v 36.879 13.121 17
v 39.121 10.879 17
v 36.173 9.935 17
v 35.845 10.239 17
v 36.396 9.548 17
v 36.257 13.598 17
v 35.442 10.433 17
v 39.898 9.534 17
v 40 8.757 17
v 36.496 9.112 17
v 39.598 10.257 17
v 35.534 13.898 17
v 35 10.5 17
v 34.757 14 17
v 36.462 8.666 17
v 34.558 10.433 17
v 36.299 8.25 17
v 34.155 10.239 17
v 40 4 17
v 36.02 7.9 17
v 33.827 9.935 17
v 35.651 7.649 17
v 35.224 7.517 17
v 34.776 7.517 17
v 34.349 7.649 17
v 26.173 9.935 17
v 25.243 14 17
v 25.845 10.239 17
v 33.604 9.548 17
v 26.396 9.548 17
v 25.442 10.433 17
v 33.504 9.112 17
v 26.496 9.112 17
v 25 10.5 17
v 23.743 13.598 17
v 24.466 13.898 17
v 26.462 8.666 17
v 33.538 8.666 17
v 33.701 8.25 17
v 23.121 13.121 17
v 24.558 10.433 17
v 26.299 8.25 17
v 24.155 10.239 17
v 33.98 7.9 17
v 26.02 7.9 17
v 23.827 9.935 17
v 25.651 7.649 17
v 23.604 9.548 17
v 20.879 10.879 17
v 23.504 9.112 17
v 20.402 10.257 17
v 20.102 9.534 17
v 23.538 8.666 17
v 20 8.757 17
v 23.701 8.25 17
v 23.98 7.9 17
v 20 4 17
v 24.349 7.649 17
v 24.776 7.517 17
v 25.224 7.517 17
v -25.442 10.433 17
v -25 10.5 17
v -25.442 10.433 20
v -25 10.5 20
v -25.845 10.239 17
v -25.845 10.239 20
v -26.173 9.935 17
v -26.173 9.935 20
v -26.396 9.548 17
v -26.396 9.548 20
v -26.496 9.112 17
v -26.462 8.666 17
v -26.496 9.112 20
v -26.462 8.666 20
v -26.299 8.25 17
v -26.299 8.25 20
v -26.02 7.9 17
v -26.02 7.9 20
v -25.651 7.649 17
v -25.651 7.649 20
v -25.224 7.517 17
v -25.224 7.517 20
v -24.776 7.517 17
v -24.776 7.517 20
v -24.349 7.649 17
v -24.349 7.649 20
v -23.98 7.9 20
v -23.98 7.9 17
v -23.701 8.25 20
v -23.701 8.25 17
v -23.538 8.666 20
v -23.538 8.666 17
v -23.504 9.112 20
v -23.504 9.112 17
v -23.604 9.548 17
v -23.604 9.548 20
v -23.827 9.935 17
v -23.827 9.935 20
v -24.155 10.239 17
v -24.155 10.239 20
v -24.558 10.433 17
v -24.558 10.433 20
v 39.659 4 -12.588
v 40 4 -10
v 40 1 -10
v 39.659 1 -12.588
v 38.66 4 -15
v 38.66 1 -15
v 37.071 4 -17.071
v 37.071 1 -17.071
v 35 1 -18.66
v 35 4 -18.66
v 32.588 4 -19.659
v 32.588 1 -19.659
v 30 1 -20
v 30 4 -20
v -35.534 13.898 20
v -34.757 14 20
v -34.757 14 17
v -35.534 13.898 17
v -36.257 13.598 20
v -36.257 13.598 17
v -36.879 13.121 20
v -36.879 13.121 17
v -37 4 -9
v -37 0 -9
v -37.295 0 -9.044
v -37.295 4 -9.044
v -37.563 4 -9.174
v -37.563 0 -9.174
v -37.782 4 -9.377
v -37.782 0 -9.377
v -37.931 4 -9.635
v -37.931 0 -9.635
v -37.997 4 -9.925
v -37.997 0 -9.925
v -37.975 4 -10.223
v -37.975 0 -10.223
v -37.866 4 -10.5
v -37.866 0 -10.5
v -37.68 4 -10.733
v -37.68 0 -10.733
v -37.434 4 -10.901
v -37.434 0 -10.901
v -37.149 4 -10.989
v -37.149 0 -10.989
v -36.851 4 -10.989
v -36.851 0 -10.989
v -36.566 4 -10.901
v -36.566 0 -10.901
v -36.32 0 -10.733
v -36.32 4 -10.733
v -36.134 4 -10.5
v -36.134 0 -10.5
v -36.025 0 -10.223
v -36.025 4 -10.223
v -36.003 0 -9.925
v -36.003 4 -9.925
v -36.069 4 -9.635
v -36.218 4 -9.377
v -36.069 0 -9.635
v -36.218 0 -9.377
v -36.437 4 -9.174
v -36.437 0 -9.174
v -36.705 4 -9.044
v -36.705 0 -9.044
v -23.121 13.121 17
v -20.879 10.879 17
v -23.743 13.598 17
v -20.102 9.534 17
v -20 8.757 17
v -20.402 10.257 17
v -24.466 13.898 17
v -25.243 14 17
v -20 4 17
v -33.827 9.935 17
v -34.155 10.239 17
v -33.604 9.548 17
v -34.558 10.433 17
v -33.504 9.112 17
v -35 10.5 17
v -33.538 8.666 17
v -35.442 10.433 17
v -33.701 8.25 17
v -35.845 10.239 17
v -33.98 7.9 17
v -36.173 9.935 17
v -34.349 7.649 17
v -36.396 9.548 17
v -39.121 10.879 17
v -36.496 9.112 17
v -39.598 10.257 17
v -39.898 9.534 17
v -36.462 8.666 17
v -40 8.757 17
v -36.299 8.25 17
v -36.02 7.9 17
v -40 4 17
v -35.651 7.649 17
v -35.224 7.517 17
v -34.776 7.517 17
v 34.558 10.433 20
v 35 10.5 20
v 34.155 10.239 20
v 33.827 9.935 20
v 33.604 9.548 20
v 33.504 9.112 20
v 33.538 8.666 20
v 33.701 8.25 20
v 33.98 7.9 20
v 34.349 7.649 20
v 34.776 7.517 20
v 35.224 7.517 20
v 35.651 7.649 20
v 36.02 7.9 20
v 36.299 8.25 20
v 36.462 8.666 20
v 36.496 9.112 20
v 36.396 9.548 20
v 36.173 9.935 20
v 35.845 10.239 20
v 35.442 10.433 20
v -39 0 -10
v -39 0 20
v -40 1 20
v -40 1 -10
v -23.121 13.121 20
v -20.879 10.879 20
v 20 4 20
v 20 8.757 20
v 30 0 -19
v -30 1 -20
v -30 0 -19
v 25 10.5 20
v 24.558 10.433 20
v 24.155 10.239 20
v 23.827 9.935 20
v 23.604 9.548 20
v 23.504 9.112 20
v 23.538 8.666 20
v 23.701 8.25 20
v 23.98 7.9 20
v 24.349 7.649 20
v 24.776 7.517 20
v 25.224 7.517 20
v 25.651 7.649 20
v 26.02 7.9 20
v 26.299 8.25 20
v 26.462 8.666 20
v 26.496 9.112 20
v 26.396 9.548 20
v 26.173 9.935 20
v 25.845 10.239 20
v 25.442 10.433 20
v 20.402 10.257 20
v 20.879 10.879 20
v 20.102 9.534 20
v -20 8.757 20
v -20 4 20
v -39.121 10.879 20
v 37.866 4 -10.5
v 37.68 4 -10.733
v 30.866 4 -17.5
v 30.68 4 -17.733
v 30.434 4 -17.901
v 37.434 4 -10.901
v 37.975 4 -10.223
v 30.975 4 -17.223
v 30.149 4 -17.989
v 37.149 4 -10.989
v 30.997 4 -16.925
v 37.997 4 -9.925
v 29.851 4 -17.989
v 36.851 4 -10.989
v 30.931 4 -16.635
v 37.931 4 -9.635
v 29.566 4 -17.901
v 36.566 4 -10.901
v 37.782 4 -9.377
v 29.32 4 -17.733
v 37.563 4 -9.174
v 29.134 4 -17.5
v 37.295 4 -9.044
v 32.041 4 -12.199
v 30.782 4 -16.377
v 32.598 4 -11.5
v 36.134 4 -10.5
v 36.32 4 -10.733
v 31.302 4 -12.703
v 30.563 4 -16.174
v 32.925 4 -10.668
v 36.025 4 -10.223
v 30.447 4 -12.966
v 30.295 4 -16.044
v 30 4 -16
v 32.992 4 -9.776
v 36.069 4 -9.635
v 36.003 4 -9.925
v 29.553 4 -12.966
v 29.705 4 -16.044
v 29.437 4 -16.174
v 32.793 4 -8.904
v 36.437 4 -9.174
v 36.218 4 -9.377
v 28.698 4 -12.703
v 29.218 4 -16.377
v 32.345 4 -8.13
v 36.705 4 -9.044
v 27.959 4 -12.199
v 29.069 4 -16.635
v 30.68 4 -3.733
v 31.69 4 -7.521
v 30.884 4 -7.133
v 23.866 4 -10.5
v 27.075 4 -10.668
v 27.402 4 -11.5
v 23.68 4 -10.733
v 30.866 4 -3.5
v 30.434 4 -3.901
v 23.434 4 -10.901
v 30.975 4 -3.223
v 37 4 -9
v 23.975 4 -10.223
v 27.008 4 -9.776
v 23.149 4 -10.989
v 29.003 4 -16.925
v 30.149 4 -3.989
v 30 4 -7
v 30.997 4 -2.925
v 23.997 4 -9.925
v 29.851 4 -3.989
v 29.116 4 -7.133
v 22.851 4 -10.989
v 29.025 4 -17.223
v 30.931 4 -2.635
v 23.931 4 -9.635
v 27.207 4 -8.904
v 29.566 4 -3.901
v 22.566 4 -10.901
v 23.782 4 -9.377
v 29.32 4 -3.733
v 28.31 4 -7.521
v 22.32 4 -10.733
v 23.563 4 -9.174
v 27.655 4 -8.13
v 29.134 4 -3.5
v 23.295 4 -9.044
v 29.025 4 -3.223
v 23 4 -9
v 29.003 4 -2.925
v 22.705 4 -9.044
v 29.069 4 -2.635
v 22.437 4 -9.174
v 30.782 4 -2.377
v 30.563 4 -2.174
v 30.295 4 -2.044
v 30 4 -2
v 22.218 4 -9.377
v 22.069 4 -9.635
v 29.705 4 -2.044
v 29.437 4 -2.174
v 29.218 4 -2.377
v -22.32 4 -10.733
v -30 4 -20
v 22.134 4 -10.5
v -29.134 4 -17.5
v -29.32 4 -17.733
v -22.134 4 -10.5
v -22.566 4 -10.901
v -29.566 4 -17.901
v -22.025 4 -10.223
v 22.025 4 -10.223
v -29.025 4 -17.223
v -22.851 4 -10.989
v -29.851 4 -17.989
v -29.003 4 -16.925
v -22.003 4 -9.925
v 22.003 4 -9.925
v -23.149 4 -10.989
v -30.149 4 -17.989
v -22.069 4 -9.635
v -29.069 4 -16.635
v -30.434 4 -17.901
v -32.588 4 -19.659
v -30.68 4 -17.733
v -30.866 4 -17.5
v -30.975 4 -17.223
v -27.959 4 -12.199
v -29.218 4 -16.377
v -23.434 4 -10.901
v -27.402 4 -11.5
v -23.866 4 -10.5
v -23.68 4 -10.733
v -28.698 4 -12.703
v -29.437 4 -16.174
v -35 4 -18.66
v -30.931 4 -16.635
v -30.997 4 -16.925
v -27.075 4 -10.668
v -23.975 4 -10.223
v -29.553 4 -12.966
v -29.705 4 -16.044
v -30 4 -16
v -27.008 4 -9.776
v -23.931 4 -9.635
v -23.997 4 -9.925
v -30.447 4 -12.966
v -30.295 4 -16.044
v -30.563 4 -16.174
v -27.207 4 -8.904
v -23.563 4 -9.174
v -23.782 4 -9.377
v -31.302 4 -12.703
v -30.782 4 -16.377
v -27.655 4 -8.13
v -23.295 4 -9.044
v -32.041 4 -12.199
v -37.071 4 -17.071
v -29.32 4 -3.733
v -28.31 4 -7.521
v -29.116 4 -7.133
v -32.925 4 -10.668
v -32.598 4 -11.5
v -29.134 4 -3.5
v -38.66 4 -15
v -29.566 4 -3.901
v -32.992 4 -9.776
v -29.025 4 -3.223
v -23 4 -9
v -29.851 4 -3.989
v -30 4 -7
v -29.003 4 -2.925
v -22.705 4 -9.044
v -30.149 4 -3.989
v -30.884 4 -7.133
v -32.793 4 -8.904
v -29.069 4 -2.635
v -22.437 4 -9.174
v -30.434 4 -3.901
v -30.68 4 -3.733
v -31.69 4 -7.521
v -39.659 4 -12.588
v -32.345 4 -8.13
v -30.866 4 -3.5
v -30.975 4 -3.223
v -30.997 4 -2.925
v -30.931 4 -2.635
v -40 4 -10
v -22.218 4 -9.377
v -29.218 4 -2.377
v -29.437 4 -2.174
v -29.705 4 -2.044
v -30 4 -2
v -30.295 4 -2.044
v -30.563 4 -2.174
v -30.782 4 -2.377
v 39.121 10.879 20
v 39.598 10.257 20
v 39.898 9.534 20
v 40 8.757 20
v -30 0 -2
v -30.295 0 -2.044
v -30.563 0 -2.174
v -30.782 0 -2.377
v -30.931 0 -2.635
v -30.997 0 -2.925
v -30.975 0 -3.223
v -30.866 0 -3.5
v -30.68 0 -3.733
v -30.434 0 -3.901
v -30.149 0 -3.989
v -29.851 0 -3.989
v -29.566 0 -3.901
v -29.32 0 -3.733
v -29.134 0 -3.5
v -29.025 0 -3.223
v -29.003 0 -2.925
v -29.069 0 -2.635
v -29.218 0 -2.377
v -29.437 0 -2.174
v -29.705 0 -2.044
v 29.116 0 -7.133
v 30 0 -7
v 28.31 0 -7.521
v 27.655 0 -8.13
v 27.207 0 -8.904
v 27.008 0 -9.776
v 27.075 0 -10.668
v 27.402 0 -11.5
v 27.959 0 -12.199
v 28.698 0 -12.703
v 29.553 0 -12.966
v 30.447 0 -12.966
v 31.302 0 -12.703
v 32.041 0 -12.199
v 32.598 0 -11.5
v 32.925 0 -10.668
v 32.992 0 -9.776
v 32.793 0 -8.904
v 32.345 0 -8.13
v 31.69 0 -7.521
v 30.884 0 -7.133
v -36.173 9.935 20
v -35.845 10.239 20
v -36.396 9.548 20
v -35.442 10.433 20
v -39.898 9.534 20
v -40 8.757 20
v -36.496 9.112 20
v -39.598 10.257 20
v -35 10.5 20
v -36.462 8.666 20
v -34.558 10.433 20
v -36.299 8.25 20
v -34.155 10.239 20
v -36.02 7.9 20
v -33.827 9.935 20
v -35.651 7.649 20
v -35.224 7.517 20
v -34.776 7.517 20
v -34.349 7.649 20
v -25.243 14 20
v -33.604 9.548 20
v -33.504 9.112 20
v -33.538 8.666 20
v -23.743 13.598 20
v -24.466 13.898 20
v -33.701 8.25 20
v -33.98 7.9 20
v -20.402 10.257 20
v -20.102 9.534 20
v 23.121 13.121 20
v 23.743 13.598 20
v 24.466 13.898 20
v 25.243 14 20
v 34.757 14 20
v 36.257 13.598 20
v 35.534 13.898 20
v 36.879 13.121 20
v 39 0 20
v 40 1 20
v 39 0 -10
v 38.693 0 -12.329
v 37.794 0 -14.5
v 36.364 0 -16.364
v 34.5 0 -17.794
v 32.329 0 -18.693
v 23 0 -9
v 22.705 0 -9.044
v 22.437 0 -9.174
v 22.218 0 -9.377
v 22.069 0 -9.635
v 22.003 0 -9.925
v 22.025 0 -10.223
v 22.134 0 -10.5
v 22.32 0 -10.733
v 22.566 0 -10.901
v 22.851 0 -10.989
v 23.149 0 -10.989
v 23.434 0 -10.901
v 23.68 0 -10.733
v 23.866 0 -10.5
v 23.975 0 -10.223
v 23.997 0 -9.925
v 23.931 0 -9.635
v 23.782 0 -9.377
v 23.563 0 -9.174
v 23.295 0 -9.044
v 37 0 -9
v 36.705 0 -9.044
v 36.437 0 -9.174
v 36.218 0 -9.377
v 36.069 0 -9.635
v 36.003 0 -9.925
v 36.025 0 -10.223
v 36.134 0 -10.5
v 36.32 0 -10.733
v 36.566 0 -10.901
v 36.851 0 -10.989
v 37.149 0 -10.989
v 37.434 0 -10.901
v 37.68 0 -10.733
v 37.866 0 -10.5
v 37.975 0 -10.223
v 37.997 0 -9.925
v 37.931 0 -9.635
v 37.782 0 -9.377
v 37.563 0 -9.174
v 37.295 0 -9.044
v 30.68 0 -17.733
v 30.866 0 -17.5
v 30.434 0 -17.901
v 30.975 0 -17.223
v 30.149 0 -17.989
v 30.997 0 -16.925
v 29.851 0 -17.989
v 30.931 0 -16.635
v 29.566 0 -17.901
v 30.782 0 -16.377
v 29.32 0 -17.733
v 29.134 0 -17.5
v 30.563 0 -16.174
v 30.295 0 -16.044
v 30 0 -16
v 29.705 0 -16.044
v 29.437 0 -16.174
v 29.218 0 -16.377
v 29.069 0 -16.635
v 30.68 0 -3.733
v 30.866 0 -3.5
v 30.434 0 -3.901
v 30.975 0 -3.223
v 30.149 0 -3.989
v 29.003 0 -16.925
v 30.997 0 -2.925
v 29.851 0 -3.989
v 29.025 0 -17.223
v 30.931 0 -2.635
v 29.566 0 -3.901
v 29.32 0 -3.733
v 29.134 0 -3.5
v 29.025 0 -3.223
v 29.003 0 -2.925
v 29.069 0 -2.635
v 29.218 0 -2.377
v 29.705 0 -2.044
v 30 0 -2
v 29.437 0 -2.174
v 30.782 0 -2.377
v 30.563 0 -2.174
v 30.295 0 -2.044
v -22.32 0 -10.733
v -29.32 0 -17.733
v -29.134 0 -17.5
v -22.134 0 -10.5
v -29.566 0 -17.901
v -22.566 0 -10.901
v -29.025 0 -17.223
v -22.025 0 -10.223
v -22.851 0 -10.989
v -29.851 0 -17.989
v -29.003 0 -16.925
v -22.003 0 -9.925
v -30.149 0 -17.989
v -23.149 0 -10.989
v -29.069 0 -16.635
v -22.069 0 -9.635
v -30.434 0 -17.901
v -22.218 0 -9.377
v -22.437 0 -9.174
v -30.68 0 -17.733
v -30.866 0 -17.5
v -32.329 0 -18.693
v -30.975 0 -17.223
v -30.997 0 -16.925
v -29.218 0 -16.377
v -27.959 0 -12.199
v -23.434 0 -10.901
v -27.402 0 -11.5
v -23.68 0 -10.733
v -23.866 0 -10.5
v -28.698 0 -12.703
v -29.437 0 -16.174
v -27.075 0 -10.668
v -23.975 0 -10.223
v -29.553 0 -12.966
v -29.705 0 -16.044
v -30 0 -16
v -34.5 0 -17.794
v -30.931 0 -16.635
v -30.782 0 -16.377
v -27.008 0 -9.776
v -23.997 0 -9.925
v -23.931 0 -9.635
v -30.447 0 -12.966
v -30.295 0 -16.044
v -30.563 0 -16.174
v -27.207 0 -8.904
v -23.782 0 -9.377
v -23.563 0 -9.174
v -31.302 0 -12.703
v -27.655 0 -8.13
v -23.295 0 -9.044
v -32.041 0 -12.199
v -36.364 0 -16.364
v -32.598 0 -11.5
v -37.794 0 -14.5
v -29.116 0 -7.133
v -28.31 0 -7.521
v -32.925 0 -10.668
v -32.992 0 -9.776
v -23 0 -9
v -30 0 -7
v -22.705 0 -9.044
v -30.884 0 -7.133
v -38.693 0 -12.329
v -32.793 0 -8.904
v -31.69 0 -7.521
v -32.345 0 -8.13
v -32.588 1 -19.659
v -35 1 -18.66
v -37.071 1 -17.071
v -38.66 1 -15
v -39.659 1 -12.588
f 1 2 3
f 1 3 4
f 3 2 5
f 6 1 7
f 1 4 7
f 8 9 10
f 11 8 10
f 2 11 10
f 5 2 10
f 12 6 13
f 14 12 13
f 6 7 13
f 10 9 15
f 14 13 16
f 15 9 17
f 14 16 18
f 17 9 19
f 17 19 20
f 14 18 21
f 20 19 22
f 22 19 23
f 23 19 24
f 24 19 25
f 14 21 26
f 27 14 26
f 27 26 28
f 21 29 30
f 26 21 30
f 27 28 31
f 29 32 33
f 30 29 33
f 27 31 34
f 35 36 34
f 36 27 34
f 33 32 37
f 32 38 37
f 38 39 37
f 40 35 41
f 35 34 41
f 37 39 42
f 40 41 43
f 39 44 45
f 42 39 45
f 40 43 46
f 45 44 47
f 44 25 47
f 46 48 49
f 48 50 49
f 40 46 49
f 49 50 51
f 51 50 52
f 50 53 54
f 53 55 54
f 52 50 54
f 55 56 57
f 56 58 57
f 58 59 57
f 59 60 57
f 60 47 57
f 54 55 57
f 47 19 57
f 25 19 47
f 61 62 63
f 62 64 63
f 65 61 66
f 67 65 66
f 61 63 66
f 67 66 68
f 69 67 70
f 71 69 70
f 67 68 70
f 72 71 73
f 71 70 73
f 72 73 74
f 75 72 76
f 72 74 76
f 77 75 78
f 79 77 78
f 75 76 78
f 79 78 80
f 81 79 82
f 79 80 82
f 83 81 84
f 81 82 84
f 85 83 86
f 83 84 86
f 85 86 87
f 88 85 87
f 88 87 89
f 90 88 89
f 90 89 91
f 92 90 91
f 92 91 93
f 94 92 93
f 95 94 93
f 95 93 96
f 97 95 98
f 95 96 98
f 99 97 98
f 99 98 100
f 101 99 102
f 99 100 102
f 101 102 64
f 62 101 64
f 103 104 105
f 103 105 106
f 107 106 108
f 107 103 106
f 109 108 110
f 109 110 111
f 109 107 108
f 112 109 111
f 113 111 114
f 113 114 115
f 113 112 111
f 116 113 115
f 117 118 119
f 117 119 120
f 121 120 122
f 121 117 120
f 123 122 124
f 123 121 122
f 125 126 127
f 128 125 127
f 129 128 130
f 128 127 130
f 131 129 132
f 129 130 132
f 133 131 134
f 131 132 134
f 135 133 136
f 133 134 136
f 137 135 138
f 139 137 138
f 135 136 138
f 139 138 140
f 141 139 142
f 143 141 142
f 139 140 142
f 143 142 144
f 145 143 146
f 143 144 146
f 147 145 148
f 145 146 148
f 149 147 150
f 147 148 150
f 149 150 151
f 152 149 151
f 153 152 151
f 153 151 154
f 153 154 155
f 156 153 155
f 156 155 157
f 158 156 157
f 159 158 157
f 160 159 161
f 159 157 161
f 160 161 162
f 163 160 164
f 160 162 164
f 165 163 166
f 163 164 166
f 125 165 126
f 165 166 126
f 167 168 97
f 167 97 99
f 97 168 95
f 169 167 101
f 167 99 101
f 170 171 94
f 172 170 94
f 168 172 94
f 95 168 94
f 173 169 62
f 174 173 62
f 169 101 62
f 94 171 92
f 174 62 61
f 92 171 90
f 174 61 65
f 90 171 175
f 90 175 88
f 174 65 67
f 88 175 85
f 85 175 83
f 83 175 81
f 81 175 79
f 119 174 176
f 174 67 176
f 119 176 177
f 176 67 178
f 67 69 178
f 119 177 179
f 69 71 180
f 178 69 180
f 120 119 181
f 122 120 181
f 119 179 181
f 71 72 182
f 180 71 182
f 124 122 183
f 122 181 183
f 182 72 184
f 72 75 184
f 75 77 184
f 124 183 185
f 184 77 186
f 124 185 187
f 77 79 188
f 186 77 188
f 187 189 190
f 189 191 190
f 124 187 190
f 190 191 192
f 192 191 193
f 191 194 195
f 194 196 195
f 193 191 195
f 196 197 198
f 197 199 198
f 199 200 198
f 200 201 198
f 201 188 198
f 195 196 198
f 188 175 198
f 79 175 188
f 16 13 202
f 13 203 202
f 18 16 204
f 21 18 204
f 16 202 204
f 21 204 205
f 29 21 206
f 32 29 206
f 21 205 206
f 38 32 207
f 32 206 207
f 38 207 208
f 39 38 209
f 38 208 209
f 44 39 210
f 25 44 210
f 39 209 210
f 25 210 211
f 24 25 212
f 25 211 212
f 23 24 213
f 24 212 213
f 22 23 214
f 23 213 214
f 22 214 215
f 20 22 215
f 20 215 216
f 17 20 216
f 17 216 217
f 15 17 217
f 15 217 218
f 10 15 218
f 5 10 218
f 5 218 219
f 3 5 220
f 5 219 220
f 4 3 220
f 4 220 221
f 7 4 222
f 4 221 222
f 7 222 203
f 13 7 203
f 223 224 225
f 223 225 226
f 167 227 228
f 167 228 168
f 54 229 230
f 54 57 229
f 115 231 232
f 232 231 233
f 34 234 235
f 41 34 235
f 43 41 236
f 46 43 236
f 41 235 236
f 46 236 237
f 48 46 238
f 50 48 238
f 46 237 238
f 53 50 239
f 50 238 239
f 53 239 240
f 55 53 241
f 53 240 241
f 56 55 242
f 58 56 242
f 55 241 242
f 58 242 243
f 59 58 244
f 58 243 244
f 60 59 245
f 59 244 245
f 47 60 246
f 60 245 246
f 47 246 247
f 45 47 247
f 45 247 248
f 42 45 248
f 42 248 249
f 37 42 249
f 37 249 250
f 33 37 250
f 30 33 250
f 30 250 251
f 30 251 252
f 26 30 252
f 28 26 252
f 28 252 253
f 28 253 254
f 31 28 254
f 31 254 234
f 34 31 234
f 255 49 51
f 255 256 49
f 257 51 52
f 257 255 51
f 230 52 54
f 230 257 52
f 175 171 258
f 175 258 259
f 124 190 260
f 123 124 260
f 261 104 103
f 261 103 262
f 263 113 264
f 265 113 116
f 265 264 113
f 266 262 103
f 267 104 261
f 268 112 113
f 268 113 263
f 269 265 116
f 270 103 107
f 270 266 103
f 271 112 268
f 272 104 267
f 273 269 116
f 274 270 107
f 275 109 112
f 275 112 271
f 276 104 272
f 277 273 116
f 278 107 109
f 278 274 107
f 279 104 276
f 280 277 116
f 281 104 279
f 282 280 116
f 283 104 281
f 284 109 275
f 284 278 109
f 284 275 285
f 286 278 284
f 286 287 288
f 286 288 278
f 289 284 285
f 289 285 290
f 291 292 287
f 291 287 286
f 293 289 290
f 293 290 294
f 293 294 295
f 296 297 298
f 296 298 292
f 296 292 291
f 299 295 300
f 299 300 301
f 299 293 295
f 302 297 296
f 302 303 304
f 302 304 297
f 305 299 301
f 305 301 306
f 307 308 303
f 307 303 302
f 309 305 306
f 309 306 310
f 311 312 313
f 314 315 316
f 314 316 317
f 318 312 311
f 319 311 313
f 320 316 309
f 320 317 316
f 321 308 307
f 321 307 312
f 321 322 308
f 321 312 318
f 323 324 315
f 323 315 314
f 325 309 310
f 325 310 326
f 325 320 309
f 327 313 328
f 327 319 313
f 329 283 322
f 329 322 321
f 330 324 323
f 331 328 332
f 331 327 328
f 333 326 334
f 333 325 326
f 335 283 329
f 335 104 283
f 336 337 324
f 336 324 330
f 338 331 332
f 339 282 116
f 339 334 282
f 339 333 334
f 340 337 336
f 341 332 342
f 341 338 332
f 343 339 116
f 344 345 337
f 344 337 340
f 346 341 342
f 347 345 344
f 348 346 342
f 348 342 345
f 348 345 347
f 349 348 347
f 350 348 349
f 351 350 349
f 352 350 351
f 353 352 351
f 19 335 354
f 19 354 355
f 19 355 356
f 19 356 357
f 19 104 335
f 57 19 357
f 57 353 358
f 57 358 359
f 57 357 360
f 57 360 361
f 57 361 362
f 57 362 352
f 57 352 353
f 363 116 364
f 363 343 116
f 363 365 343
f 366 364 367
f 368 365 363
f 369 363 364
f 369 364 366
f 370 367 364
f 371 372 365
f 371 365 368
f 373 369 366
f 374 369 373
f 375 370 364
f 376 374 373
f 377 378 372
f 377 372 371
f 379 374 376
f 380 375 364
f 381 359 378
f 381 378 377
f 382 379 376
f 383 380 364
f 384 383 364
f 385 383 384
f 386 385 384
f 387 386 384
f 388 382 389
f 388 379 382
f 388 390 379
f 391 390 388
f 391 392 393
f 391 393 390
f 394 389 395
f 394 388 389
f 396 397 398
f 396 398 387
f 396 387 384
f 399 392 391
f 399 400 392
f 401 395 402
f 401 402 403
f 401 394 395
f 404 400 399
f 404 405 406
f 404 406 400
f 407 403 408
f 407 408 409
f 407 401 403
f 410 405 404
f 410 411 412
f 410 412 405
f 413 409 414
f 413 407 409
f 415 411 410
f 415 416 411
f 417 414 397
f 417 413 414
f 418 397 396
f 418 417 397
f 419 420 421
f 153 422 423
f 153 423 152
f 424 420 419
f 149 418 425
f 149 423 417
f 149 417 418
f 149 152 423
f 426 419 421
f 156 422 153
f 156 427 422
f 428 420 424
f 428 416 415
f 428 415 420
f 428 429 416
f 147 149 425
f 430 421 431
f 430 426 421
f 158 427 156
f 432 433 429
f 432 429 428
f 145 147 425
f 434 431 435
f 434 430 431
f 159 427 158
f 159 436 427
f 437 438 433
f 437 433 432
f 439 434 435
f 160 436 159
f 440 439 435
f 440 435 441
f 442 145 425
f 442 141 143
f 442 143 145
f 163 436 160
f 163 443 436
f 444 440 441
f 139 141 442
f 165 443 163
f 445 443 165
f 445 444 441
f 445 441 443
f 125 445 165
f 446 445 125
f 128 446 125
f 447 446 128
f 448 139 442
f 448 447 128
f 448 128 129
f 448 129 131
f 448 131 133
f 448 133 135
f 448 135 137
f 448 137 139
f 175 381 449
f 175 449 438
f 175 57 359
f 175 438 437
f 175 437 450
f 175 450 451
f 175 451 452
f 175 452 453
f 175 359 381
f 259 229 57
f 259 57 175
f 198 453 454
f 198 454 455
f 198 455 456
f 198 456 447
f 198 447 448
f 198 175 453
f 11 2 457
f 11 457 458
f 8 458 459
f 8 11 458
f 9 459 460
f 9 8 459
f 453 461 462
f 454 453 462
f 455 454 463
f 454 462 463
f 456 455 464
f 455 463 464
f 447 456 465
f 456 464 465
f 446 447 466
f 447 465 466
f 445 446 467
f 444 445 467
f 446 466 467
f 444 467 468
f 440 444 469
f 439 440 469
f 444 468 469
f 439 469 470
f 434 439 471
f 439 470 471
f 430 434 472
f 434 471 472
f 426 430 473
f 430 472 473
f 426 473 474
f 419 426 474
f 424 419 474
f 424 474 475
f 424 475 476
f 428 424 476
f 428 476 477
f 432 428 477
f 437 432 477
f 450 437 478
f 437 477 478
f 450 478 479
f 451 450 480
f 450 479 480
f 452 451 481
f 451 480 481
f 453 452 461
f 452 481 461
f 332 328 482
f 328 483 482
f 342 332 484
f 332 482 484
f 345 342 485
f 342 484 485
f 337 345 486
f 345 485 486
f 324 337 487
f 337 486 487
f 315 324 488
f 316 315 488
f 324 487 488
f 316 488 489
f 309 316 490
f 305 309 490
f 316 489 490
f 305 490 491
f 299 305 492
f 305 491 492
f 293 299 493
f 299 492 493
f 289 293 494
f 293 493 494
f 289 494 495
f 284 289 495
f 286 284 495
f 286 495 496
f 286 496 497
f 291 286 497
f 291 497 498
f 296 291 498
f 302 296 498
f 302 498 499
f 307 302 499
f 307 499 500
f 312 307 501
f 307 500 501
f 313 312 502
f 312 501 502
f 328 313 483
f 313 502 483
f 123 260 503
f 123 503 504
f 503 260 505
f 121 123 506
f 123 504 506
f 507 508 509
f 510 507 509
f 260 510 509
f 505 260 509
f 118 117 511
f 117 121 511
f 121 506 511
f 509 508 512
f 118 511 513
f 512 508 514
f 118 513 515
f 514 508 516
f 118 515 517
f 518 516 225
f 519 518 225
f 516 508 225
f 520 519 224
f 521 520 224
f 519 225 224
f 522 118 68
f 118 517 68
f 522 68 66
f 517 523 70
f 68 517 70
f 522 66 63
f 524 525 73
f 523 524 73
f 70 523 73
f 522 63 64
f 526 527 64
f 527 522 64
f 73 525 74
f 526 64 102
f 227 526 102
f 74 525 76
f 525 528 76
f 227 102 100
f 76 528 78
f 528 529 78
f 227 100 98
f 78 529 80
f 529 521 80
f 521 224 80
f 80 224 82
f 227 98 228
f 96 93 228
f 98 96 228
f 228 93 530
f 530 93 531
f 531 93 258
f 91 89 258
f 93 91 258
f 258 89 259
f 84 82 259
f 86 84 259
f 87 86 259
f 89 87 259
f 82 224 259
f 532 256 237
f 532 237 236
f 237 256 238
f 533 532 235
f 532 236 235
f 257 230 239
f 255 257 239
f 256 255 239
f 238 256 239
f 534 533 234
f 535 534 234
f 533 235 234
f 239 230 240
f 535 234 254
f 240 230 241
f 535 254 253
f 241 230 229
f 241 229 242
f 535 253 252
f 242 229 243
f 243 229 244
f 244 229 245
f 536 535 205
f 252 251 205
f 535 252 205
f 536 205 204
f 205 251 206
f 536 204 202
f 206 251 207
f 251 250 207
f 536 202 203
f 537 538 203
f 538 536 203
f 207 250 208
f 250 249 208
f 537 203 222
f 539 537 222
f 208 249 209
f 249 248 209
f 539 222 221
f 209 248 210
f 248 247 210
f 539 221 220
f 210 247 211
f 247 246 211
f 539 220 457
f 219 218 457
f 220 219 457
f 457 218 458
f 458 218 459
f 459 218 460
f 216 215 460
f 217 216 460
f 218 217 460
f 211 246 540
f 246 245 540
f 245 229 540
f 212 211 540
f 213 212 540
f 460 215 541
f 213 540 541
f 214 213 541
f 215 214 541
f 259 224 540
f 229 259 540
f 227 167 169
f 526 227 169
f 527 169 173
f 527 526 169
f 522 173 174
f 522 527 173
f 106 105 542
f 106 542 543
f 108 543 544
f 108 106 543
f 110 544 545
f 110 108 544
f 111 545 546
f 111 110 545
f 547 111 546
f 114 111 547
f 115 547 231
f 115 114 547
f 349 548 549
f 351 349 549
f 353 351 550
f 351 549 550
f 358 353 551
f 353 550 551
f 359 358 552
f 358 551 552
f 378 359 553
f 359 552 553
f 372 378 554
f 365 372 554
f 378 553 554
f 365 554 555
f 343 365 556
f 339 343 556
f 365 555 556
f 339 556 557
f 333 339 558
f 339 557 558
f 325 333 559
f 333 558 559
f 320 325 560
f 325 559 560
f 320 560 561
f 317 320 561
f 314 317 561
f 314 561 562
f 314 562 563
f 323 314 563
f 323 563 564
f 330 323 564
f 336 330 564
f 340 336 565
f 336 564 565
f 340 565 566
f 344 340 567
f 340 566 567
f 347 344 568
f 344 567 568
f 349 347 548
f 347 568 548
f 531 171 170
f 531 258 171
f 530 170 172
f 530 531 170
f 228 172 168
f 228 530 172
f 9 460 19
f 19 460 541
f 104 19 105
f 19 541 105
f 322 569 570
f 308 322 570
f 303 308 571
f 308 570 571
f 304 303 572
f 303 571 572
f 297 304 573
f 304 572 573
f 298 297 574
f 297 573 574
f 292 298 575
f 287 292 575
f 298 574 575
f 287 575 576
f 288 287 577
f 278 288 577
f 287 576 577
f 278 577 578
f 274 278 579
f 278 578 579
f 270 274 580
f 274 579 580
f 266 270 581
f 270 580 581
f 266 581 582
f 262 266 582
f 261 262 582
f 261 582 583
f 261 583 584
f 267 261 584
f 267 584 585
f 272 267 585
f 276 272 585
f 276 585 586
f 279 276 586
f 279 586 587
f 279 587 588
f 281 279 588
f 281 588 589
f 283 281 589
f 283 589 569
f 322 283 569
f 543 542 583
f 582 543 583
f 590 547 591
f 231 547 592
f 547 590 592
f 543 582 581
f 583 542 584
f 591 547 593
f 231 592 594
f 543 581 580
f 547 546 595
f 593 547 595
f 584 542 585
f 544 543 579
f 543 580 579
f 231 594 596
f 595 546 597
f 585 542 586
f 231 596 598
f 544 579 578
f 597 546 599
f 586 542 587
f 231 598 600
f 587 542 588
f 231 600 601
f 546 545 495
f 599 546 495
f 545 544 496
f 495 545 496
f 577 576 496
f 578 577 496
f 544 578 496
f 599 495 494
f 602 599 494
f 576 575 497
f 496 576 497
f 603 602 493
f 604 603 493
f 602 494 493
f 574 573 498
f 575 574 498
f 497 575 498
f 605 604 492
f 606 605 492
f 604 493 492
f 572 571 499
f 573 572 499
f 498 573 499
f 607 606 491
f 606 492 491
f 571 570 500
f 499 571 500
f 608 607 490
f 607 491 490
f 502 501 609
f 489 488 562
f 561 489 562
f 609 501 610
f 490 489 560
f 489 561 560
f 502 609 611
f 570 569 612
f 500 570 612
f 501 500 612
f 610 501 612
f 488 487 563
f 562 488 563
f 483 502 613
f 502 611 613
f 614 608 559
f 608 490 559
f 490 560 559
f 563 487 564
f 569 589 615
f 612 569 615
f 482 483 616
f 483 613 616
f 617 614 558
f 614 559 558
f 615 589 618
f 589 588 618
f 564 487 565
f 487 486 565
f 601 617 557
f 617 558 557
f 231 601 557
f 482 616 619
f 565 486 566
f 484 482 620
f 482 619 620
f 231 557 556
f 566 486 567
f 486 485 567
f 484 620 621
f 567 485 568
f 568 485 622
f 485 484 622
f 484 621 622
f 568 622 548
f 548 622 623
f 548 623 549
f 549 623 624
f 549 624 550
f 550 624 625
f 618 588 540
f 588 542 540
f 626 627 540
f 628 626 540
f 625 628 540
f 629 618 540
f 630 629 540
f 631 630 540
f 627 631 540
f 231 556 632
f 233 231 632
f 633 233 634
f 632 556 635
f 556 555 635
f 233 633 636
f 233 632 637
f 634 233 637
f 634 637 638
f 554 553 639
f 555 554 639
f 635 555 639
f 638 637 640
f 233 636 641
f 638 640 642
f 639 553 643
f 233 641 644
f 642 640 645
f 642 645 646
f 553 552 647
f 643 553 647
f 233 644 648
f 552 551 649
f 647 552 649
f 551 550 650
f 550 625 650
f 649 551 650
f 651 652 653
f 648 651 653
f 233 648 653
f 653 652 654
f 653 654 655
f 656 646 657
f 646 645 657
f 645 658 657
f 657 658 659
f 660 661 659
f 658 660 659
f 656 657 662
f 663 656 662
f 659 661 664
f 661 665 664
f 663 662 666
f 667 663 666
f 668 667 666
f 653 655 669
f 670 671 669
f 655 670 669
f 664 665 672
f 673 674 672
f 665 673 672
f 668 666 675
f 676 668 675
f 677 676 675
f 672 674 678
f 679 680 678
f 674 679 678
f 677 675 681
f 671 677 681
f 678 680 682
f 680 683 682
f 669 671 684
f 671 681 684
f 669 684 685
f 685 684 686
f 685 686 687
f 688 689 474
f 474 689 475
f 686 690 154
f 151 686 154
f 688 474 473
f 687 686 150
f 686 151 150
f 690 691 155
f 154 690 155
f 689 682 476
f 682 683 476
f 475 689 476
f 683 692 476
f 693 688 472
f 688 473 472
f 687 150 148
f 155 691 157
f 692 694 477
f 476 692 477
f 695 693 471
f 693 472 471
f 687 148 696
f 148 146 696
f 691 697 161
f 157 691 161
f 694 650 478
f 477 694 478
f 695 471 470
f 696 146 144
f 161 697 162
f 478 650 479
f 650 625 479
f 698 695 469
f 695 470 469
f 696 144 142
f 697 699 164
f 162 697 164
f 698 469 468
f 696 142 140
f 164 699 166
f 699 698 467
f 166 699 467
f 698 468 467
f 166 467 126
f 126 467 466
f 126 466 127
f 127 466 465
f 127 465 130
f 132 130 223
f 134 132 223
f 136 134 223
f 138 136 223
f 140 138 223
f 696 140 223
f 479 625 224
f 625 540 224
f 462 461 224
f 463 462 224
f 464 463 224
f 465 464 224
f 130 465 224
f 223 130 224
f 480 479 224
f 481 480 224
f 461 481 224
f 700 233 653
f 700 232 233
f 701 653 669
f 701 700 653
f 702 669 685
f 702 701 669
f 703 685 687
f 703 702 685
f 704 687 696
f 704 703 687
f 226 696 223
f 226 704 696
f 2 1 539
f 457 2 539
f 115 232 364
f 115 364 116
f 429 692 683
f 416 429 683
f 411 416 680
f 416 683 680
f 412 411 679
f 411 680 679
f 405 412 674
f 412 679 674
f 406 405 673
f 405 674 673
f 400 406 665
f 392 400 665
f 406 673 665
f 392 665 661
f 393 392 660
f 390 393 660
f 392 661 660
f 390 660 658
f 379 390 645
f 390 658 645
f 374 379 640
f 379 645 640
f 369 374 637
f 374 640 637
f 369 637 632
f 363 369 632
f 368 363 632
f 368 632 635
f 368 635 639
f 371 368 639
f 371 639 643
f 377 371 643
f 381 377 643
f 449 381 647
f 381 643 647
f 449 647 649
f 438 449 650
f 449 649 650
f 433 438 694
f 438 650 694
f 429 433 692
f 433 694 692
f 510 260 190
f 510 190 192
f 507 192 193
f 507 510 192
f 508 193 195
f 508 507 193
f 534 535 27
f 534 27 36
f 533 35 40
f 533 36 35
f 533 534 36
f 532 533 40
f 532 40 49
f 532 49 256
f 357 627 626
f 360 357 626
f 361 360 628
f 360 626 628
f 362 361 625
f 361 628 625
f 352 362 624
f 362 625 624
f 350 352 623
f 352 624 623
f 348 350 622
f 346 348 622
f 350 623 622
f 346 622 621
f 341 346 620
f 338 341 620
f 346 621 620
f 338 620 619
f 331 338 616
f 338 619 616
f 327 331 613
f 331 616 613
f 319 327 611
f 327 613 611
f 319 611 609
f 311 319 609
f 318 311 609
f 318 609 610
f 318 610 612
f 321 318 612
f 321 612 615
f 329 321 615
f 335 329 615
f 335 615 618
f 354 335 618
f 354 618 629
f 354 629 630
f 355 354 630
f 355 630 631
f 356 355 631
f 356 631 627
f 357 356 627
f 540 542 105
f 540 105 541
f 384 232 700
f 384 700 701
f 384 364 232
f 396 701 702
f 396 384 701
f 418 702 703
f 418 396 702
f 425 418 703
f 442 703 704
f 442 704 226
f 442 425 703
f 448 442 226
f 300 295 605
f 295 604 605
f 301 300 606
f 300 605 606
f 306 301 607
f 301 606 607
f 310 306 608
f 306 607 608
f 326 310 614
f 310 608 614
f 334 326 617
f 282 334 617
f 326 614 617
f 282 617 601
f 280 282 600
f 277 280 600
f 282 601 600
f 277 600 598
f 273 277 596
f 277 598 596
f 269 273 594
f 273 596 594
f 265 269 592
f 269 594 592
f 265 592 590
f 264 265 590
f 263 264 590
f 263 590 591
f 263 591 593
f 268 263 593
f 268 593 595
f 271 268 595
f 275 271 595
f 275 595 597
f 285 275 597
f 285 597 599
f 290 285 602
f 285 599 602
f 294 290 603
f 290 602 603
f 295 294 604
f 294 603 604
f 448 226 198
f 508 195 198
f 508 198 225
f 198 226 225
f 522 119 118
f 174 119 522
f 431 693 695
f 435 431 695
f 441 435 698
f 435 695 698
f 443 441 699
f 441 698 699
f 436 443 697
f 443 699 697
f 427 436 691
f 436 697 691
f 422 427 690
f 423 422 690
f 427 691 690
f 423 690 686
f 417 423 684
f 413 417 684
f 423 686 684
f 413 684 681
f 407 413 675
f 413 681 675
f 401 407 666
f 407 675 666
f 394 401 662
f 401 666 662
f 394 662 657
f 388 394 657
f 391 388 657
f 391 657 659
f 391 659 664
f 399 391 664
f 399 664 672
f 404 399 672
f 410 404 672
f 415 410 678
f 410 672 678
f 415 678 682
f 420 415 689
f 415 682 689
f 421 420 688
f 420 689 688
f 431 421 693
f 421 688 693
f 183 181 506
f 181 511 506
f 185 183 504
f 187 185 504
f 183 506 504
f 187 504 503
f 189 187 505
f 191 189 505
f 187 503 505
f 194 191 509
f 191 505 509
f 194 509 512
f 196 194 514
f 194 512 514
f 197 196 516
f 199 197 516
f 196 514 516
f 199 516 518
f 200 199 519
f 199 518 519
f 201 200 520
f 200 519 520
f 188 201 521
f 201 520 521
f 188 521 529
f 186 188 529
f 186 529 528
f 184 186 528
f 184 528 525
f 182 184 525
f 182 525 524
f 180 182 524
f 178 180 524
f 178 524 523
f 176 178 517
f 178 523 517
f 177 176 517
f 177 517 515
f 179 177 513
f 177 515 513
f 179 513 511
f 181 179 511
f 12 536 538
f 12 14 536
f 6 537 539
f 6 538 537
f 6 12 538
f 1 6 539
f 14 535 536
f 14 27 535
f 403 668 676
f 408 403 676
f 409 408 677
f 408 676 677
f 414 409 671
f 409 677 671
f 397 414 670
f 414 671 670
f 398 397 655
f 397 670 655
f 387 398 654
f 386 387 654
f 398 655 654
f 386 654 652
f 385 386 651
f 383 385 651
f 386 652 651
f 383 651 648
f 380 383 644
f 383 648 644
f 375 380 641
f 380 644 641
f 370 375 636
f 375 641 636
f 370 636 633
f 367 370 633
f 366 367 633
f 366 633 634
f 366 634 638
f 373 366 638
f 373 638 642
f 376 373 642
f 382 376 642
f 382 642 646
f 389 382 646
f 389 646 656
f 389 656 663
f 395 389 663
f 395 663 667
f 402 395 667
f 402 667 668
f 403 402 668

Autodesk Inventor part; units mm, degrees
ref_plane "YZ Plane" through (0, 0, 0) normal (1, 0, 0) x (0, 1, 0)
ref_plane "XZ Plane" through (0, 0, 0) normal (0, 1, 0) x (-1, 0, 0)
ref_plane "XY Plane" through (0, 0, 0) normal (0, 0, 1) x (1, 0, 0)
sketch "Sketch1" plane through (0, 0, 0) normal (0, 1, 0) x (-1, 0, 0)
  line L0 (56, 0) -> (-56, 0) projected
  line L1 (0, -49) -> (0, 49) projected
  line L2 (40, -20) -> (-40, -20)
  line L3 (-40, -20) -> (-40, 20)
  line L4 (-40, 20) -> (40, 20)
  line L5 (40, 20) -> (40, -20)
  line L6 (27.5, -35) -> (-27.5, -35) construction
  line L7 (-27.5, -35) -> (-27.5, 35) construction
  line L8 (-27.5, 35) -> (27.5, 35) construction
  line L9 (27.5, 35) -> (27.5, -35) construction
  point P0 (0, 0)
  dimension "d0" = 80
  dimension "d1" = 40
  dimension "d2" = 70
  dimension "d3" = 55
extrude "Extrusion1" add sketch "Sketch1" along normal blind 4
sketch "Sketch18" plane through (0, 4, 0) normal (0, 1, 0) x (1, 0, 0)
  line L0 (40, 20) -> (-40, 20) projected
  line L1 (-40, 20) -> (-40, -20) projected
  line L2 (-40, -20) -> (40, -20) projected
  line L3 (40, -20) -> (40, 20) projected
  line L4 (-40, -20) -> (40, -20)
  line L5 (40, -20) -> (40, -17)
  line L6 (40, -17) -> (-40, -17)
  line L7 (-40, -17) -> (-40, -20)
  line L8 (-40, 20) -> (-40, -20) projected
  line L9 (40, -20) -> (40, 20) projected
  line L10 (-40, -20) -> (40, -20) projected
  point P0 (0, 0)
  dimension "d207" = 3
extrude "Extrusion13" add sketch "Sketch18" along normal blind 10 contours L3 L2 L1 L6
sketch "Sketch19" plane through (0, 4, 0) normal (0, 1, 0) x (1, 0, 0)
  line L0 (-40, -17) -> (40, -17) projected
  line L1 (40, -17) -> (40, 20) projected
  line L2 (40, 20) -> (-40, 20) projected
  line L3 (-40, 20) -> (-40, -17) projected
  line L4 (0, 28) -> (0, -28) projected
  point P0 (0, 0)
  point P1 (-30, 10)
  point P2 (30, 10)
  dimension "d210" = 10
  dimension "d211" = 10
hole "Hole9" at (-30, 4, -10) at (30, 4, -10) direction (0, -1, 0) diameter 6 end through all
sketch "Sketch20" plane through (0, 4, 0) normal (0, 1, 0) x (1, 0, 0)
  circle A0 centre (-30, 10) radius 3 projected
  line L0 (-40, -17) -> (40, -17) projected
  line L1 (40, -17) -> (40, 20) projected
  line L2 (40, 20) -> (-40, 20) projected
  line L3 (-40, 20) -> (-40, -17) projected
  line L4 (-30, -17) -> (-30, 20) construction
  line L5 (-40, 20) -> (-40, -17) projected
  line L6 (40, 20) -> (-40, 20) projected
  line L7 (40, -17) -> (-40, -17) projected
  line L8 (-39.3154, 10) -> (-16.7888, 10) construction
  line L9 (0, 28) -> (0, -28) projected
  point P0 (0, 0)
  point P1 (-37, 10)
  point P2 (-23, 10)
  point P3 (-30, 3)
  point P4 (-30, 17)
  point P5 (37, 10)
  point P6 (23, 10)
  point P7 (30, 3)
  point P8 (30, 17)
  dimension "d219" = 7
  dimension "d220" = 7
  dimension "d221" = 7
  dimension "d222" = 7
hole "Hole10" at (-37, 4, -10) at (-23, 4, -10) at (-30, 4, -3) at (-30, 4, -17) at (30, 4, -3) at (37, 4, -10) at (30, 4, -17) at (23, 4, -10) direction (0, -1, 0) diameter 2 end through all
fillet "Fillet11" radius 10 2 edges at (40, 2, -20) (-40, 2, -20)
sketch "Sketch21" plane through (40, 4, 17) normal (0, 0, -1) x (-1, 0, 0)
  line L0 (80, 0) -> (0, 0) projected
  line L1 (80, 0) -> (80, 10) projected
  line L2 (0, 10) -> (80, 10) projected
  line L3 (0, 0) -> (0, 10) projected
  point P0 (40, -4)
  point P1 (5, 5)
  point P2 (75, 5)
  dimension "d232" = 5
  dimension "d233" = 5
  dimension "d234" = 5
  dimension "d235" = 5
hole "Hole11" at (35, 9, 17) at (-35, 9, 17) direction (0, 0, 1) diameter 3 end through all
chamfer "Chamfer5" distance 4 angle 45 2 edges at (-40, 14, 18.5) (40, 14, 18.5)
fillet "Fillet12" radius 3 4 edges at (-36, 14, 18.5) (-40, 10, 18.5) (36, 14, 18.5) (40, 10, 18.5)
sketch "Sketch22" plane through (40, 4, 17) normal (0, 0, -1) x (-1, 0, 0)
  circle A0 centre (5, 5) radius 1.5 projected
  circle A1 centre (75, 5) radius 1.5 projected
  arc A2 (0.8787, 6.8787) -> (0, 4.7574) centre (3, 4.7574) ccw projected
  line L0 (0, 0) -> (0, 4.7574) projected
  line L1 (80, 0) -> (0, 0) projected
  line L2 (80, 0) -> (80, 4.7574) projected
  arc A3 (80, 4.7574) -> (79.1213, 6.8787) centre (77, 4.7574) ccw projected
  line L3 (76.8787, 9.1213) -> (79.1213, 6.8787) projected
  arc A4 (76.8787, 9.1213) -> (74.7574, 10) centre (74.7574, 7) ccw projected
  line L4 (5.2426, 10) -> (74.7574, 10) projected
  arc A5 (5.2426, 10) -> (3.1213, 9.1213) centre (5.2426, 7) ccw projected
  line L5 (0.8787, 6.8787) -> (3.1213, 9.1213) projected
  line L6 (10, 0) -> (70, 0) projected
  line L7 (20, 10) -> (60, 10)
  line L8 (60, 10) -> (60, 0)
  line L9 (60, 0) -> (20, 0)
  line L10 (20, 0) -> (20, 10)
  point P0 (40, -4)
  point P1 (40, 5)
  dimension "d247" = 5
  dimension "d248" = 40
  dimension "d256" = 40
  dimension "d257" = 10
  dimension "d258" = 20
extrude "Extrusion14" cut sketch "Sketch22" against normal up to next contours L4 L8 L1 L10
chamfer "Chamfer6" distance 4 angle 45 2 edges at (-20, 14, 18.5) (20, 14, 18.5)
fillet "Fillet13" radius 3 4 edges at (-24, 14, 18.5) (-20, 10, 18.5) (24, 14, 18.5) (20, 10, 18.5)
sketch "Sketch23" plane through (40, 4, 17) normal (0, 0, -1) x (-1, 0, 0)
  arc A0 (20, 4.7574) -> (19.1213, 6.8787) centre (17, 4.7574) ccw projected
  line L0 (16.8787, 9.1213) -> (19.1213, 6.8787) projected
  arc A1 (16.8787, 9.1213) -> (14.7574, 10) centre (14.7574, 7) ccw projected
  line L1 (5.2426, 10) -> (14.7574, 10) projected
  arc A2 (5.2426, 10) -> (3.1213, 9.1213) centre (5.2426, 7) ccw projected
  line L2 (0.8787, 6.8787) -> (3.1213, 9.1213) projected
  arc A3 (0.8787, 6.8787) -> (0, 4.7574) centre (3, 4.7574) ccw projected
  line L3 (0, 0) -> (0, 4.7574) projected
  line L4 (20, 0) -> (0, 0) projected
  line L5 (20, 0) -> (20, 4.7574) projected
  circle A4 centre (5, 5) radius 1.5 projected
  arc A5 (60.8787, 6.8787) -> (60, 4.7574) centre (63, 4.7574) ccw projected
  line L6 (60, 4.7574) -> (60, 0) projected
  line L7 (80, 0) -> (60, 0) projected
  line L8 (80, 0) -> (80, 4.7574) projected
  arc A6 (80, 4.7574) -> (79.1213, 6.8787) centre (77, 4.7574) ccw projected
  line L9 (76.8787, 9.1213) -> (79.1213, 6.8787) projected
  arc A7 (76.8787, 9.1213) -> (74.7574, 10) centre (74.7574, 7) ccw projected
  line L10 (65.2426, 10) -> (74.7574, 10) projected
  arc A8 (65.2426, 10) -> (63.1213, 9.1213) centre (65.2426, 7) ccw projected
  line L11 (60.8787, 6.8787) -> (63.1213, 9.1213) projected
  circle A9 centre (75, 5) radius 1.5 projected
  point P0 (40, -4)
  point P1 (15, 5)
  point P2 (65, 5)
  dimension "d265" = 5
  dimension "d266" = 5
  dimension "d267" = 5
  dimension "d268" = 5
hole "Hole13" at (25, 9, 17) at (-25, 9, 17) direction (0, 0, 1) diameter 3 end through all
chamfer "Chamfer7" distance 1 angle 45 5 edges at (0, 0, -20) (37.0711, 0, -17.0711) (40, 0, 5) (-37.0711, 0, -17.0711) (-40, 0, 5)
properties part number "body_v3"
